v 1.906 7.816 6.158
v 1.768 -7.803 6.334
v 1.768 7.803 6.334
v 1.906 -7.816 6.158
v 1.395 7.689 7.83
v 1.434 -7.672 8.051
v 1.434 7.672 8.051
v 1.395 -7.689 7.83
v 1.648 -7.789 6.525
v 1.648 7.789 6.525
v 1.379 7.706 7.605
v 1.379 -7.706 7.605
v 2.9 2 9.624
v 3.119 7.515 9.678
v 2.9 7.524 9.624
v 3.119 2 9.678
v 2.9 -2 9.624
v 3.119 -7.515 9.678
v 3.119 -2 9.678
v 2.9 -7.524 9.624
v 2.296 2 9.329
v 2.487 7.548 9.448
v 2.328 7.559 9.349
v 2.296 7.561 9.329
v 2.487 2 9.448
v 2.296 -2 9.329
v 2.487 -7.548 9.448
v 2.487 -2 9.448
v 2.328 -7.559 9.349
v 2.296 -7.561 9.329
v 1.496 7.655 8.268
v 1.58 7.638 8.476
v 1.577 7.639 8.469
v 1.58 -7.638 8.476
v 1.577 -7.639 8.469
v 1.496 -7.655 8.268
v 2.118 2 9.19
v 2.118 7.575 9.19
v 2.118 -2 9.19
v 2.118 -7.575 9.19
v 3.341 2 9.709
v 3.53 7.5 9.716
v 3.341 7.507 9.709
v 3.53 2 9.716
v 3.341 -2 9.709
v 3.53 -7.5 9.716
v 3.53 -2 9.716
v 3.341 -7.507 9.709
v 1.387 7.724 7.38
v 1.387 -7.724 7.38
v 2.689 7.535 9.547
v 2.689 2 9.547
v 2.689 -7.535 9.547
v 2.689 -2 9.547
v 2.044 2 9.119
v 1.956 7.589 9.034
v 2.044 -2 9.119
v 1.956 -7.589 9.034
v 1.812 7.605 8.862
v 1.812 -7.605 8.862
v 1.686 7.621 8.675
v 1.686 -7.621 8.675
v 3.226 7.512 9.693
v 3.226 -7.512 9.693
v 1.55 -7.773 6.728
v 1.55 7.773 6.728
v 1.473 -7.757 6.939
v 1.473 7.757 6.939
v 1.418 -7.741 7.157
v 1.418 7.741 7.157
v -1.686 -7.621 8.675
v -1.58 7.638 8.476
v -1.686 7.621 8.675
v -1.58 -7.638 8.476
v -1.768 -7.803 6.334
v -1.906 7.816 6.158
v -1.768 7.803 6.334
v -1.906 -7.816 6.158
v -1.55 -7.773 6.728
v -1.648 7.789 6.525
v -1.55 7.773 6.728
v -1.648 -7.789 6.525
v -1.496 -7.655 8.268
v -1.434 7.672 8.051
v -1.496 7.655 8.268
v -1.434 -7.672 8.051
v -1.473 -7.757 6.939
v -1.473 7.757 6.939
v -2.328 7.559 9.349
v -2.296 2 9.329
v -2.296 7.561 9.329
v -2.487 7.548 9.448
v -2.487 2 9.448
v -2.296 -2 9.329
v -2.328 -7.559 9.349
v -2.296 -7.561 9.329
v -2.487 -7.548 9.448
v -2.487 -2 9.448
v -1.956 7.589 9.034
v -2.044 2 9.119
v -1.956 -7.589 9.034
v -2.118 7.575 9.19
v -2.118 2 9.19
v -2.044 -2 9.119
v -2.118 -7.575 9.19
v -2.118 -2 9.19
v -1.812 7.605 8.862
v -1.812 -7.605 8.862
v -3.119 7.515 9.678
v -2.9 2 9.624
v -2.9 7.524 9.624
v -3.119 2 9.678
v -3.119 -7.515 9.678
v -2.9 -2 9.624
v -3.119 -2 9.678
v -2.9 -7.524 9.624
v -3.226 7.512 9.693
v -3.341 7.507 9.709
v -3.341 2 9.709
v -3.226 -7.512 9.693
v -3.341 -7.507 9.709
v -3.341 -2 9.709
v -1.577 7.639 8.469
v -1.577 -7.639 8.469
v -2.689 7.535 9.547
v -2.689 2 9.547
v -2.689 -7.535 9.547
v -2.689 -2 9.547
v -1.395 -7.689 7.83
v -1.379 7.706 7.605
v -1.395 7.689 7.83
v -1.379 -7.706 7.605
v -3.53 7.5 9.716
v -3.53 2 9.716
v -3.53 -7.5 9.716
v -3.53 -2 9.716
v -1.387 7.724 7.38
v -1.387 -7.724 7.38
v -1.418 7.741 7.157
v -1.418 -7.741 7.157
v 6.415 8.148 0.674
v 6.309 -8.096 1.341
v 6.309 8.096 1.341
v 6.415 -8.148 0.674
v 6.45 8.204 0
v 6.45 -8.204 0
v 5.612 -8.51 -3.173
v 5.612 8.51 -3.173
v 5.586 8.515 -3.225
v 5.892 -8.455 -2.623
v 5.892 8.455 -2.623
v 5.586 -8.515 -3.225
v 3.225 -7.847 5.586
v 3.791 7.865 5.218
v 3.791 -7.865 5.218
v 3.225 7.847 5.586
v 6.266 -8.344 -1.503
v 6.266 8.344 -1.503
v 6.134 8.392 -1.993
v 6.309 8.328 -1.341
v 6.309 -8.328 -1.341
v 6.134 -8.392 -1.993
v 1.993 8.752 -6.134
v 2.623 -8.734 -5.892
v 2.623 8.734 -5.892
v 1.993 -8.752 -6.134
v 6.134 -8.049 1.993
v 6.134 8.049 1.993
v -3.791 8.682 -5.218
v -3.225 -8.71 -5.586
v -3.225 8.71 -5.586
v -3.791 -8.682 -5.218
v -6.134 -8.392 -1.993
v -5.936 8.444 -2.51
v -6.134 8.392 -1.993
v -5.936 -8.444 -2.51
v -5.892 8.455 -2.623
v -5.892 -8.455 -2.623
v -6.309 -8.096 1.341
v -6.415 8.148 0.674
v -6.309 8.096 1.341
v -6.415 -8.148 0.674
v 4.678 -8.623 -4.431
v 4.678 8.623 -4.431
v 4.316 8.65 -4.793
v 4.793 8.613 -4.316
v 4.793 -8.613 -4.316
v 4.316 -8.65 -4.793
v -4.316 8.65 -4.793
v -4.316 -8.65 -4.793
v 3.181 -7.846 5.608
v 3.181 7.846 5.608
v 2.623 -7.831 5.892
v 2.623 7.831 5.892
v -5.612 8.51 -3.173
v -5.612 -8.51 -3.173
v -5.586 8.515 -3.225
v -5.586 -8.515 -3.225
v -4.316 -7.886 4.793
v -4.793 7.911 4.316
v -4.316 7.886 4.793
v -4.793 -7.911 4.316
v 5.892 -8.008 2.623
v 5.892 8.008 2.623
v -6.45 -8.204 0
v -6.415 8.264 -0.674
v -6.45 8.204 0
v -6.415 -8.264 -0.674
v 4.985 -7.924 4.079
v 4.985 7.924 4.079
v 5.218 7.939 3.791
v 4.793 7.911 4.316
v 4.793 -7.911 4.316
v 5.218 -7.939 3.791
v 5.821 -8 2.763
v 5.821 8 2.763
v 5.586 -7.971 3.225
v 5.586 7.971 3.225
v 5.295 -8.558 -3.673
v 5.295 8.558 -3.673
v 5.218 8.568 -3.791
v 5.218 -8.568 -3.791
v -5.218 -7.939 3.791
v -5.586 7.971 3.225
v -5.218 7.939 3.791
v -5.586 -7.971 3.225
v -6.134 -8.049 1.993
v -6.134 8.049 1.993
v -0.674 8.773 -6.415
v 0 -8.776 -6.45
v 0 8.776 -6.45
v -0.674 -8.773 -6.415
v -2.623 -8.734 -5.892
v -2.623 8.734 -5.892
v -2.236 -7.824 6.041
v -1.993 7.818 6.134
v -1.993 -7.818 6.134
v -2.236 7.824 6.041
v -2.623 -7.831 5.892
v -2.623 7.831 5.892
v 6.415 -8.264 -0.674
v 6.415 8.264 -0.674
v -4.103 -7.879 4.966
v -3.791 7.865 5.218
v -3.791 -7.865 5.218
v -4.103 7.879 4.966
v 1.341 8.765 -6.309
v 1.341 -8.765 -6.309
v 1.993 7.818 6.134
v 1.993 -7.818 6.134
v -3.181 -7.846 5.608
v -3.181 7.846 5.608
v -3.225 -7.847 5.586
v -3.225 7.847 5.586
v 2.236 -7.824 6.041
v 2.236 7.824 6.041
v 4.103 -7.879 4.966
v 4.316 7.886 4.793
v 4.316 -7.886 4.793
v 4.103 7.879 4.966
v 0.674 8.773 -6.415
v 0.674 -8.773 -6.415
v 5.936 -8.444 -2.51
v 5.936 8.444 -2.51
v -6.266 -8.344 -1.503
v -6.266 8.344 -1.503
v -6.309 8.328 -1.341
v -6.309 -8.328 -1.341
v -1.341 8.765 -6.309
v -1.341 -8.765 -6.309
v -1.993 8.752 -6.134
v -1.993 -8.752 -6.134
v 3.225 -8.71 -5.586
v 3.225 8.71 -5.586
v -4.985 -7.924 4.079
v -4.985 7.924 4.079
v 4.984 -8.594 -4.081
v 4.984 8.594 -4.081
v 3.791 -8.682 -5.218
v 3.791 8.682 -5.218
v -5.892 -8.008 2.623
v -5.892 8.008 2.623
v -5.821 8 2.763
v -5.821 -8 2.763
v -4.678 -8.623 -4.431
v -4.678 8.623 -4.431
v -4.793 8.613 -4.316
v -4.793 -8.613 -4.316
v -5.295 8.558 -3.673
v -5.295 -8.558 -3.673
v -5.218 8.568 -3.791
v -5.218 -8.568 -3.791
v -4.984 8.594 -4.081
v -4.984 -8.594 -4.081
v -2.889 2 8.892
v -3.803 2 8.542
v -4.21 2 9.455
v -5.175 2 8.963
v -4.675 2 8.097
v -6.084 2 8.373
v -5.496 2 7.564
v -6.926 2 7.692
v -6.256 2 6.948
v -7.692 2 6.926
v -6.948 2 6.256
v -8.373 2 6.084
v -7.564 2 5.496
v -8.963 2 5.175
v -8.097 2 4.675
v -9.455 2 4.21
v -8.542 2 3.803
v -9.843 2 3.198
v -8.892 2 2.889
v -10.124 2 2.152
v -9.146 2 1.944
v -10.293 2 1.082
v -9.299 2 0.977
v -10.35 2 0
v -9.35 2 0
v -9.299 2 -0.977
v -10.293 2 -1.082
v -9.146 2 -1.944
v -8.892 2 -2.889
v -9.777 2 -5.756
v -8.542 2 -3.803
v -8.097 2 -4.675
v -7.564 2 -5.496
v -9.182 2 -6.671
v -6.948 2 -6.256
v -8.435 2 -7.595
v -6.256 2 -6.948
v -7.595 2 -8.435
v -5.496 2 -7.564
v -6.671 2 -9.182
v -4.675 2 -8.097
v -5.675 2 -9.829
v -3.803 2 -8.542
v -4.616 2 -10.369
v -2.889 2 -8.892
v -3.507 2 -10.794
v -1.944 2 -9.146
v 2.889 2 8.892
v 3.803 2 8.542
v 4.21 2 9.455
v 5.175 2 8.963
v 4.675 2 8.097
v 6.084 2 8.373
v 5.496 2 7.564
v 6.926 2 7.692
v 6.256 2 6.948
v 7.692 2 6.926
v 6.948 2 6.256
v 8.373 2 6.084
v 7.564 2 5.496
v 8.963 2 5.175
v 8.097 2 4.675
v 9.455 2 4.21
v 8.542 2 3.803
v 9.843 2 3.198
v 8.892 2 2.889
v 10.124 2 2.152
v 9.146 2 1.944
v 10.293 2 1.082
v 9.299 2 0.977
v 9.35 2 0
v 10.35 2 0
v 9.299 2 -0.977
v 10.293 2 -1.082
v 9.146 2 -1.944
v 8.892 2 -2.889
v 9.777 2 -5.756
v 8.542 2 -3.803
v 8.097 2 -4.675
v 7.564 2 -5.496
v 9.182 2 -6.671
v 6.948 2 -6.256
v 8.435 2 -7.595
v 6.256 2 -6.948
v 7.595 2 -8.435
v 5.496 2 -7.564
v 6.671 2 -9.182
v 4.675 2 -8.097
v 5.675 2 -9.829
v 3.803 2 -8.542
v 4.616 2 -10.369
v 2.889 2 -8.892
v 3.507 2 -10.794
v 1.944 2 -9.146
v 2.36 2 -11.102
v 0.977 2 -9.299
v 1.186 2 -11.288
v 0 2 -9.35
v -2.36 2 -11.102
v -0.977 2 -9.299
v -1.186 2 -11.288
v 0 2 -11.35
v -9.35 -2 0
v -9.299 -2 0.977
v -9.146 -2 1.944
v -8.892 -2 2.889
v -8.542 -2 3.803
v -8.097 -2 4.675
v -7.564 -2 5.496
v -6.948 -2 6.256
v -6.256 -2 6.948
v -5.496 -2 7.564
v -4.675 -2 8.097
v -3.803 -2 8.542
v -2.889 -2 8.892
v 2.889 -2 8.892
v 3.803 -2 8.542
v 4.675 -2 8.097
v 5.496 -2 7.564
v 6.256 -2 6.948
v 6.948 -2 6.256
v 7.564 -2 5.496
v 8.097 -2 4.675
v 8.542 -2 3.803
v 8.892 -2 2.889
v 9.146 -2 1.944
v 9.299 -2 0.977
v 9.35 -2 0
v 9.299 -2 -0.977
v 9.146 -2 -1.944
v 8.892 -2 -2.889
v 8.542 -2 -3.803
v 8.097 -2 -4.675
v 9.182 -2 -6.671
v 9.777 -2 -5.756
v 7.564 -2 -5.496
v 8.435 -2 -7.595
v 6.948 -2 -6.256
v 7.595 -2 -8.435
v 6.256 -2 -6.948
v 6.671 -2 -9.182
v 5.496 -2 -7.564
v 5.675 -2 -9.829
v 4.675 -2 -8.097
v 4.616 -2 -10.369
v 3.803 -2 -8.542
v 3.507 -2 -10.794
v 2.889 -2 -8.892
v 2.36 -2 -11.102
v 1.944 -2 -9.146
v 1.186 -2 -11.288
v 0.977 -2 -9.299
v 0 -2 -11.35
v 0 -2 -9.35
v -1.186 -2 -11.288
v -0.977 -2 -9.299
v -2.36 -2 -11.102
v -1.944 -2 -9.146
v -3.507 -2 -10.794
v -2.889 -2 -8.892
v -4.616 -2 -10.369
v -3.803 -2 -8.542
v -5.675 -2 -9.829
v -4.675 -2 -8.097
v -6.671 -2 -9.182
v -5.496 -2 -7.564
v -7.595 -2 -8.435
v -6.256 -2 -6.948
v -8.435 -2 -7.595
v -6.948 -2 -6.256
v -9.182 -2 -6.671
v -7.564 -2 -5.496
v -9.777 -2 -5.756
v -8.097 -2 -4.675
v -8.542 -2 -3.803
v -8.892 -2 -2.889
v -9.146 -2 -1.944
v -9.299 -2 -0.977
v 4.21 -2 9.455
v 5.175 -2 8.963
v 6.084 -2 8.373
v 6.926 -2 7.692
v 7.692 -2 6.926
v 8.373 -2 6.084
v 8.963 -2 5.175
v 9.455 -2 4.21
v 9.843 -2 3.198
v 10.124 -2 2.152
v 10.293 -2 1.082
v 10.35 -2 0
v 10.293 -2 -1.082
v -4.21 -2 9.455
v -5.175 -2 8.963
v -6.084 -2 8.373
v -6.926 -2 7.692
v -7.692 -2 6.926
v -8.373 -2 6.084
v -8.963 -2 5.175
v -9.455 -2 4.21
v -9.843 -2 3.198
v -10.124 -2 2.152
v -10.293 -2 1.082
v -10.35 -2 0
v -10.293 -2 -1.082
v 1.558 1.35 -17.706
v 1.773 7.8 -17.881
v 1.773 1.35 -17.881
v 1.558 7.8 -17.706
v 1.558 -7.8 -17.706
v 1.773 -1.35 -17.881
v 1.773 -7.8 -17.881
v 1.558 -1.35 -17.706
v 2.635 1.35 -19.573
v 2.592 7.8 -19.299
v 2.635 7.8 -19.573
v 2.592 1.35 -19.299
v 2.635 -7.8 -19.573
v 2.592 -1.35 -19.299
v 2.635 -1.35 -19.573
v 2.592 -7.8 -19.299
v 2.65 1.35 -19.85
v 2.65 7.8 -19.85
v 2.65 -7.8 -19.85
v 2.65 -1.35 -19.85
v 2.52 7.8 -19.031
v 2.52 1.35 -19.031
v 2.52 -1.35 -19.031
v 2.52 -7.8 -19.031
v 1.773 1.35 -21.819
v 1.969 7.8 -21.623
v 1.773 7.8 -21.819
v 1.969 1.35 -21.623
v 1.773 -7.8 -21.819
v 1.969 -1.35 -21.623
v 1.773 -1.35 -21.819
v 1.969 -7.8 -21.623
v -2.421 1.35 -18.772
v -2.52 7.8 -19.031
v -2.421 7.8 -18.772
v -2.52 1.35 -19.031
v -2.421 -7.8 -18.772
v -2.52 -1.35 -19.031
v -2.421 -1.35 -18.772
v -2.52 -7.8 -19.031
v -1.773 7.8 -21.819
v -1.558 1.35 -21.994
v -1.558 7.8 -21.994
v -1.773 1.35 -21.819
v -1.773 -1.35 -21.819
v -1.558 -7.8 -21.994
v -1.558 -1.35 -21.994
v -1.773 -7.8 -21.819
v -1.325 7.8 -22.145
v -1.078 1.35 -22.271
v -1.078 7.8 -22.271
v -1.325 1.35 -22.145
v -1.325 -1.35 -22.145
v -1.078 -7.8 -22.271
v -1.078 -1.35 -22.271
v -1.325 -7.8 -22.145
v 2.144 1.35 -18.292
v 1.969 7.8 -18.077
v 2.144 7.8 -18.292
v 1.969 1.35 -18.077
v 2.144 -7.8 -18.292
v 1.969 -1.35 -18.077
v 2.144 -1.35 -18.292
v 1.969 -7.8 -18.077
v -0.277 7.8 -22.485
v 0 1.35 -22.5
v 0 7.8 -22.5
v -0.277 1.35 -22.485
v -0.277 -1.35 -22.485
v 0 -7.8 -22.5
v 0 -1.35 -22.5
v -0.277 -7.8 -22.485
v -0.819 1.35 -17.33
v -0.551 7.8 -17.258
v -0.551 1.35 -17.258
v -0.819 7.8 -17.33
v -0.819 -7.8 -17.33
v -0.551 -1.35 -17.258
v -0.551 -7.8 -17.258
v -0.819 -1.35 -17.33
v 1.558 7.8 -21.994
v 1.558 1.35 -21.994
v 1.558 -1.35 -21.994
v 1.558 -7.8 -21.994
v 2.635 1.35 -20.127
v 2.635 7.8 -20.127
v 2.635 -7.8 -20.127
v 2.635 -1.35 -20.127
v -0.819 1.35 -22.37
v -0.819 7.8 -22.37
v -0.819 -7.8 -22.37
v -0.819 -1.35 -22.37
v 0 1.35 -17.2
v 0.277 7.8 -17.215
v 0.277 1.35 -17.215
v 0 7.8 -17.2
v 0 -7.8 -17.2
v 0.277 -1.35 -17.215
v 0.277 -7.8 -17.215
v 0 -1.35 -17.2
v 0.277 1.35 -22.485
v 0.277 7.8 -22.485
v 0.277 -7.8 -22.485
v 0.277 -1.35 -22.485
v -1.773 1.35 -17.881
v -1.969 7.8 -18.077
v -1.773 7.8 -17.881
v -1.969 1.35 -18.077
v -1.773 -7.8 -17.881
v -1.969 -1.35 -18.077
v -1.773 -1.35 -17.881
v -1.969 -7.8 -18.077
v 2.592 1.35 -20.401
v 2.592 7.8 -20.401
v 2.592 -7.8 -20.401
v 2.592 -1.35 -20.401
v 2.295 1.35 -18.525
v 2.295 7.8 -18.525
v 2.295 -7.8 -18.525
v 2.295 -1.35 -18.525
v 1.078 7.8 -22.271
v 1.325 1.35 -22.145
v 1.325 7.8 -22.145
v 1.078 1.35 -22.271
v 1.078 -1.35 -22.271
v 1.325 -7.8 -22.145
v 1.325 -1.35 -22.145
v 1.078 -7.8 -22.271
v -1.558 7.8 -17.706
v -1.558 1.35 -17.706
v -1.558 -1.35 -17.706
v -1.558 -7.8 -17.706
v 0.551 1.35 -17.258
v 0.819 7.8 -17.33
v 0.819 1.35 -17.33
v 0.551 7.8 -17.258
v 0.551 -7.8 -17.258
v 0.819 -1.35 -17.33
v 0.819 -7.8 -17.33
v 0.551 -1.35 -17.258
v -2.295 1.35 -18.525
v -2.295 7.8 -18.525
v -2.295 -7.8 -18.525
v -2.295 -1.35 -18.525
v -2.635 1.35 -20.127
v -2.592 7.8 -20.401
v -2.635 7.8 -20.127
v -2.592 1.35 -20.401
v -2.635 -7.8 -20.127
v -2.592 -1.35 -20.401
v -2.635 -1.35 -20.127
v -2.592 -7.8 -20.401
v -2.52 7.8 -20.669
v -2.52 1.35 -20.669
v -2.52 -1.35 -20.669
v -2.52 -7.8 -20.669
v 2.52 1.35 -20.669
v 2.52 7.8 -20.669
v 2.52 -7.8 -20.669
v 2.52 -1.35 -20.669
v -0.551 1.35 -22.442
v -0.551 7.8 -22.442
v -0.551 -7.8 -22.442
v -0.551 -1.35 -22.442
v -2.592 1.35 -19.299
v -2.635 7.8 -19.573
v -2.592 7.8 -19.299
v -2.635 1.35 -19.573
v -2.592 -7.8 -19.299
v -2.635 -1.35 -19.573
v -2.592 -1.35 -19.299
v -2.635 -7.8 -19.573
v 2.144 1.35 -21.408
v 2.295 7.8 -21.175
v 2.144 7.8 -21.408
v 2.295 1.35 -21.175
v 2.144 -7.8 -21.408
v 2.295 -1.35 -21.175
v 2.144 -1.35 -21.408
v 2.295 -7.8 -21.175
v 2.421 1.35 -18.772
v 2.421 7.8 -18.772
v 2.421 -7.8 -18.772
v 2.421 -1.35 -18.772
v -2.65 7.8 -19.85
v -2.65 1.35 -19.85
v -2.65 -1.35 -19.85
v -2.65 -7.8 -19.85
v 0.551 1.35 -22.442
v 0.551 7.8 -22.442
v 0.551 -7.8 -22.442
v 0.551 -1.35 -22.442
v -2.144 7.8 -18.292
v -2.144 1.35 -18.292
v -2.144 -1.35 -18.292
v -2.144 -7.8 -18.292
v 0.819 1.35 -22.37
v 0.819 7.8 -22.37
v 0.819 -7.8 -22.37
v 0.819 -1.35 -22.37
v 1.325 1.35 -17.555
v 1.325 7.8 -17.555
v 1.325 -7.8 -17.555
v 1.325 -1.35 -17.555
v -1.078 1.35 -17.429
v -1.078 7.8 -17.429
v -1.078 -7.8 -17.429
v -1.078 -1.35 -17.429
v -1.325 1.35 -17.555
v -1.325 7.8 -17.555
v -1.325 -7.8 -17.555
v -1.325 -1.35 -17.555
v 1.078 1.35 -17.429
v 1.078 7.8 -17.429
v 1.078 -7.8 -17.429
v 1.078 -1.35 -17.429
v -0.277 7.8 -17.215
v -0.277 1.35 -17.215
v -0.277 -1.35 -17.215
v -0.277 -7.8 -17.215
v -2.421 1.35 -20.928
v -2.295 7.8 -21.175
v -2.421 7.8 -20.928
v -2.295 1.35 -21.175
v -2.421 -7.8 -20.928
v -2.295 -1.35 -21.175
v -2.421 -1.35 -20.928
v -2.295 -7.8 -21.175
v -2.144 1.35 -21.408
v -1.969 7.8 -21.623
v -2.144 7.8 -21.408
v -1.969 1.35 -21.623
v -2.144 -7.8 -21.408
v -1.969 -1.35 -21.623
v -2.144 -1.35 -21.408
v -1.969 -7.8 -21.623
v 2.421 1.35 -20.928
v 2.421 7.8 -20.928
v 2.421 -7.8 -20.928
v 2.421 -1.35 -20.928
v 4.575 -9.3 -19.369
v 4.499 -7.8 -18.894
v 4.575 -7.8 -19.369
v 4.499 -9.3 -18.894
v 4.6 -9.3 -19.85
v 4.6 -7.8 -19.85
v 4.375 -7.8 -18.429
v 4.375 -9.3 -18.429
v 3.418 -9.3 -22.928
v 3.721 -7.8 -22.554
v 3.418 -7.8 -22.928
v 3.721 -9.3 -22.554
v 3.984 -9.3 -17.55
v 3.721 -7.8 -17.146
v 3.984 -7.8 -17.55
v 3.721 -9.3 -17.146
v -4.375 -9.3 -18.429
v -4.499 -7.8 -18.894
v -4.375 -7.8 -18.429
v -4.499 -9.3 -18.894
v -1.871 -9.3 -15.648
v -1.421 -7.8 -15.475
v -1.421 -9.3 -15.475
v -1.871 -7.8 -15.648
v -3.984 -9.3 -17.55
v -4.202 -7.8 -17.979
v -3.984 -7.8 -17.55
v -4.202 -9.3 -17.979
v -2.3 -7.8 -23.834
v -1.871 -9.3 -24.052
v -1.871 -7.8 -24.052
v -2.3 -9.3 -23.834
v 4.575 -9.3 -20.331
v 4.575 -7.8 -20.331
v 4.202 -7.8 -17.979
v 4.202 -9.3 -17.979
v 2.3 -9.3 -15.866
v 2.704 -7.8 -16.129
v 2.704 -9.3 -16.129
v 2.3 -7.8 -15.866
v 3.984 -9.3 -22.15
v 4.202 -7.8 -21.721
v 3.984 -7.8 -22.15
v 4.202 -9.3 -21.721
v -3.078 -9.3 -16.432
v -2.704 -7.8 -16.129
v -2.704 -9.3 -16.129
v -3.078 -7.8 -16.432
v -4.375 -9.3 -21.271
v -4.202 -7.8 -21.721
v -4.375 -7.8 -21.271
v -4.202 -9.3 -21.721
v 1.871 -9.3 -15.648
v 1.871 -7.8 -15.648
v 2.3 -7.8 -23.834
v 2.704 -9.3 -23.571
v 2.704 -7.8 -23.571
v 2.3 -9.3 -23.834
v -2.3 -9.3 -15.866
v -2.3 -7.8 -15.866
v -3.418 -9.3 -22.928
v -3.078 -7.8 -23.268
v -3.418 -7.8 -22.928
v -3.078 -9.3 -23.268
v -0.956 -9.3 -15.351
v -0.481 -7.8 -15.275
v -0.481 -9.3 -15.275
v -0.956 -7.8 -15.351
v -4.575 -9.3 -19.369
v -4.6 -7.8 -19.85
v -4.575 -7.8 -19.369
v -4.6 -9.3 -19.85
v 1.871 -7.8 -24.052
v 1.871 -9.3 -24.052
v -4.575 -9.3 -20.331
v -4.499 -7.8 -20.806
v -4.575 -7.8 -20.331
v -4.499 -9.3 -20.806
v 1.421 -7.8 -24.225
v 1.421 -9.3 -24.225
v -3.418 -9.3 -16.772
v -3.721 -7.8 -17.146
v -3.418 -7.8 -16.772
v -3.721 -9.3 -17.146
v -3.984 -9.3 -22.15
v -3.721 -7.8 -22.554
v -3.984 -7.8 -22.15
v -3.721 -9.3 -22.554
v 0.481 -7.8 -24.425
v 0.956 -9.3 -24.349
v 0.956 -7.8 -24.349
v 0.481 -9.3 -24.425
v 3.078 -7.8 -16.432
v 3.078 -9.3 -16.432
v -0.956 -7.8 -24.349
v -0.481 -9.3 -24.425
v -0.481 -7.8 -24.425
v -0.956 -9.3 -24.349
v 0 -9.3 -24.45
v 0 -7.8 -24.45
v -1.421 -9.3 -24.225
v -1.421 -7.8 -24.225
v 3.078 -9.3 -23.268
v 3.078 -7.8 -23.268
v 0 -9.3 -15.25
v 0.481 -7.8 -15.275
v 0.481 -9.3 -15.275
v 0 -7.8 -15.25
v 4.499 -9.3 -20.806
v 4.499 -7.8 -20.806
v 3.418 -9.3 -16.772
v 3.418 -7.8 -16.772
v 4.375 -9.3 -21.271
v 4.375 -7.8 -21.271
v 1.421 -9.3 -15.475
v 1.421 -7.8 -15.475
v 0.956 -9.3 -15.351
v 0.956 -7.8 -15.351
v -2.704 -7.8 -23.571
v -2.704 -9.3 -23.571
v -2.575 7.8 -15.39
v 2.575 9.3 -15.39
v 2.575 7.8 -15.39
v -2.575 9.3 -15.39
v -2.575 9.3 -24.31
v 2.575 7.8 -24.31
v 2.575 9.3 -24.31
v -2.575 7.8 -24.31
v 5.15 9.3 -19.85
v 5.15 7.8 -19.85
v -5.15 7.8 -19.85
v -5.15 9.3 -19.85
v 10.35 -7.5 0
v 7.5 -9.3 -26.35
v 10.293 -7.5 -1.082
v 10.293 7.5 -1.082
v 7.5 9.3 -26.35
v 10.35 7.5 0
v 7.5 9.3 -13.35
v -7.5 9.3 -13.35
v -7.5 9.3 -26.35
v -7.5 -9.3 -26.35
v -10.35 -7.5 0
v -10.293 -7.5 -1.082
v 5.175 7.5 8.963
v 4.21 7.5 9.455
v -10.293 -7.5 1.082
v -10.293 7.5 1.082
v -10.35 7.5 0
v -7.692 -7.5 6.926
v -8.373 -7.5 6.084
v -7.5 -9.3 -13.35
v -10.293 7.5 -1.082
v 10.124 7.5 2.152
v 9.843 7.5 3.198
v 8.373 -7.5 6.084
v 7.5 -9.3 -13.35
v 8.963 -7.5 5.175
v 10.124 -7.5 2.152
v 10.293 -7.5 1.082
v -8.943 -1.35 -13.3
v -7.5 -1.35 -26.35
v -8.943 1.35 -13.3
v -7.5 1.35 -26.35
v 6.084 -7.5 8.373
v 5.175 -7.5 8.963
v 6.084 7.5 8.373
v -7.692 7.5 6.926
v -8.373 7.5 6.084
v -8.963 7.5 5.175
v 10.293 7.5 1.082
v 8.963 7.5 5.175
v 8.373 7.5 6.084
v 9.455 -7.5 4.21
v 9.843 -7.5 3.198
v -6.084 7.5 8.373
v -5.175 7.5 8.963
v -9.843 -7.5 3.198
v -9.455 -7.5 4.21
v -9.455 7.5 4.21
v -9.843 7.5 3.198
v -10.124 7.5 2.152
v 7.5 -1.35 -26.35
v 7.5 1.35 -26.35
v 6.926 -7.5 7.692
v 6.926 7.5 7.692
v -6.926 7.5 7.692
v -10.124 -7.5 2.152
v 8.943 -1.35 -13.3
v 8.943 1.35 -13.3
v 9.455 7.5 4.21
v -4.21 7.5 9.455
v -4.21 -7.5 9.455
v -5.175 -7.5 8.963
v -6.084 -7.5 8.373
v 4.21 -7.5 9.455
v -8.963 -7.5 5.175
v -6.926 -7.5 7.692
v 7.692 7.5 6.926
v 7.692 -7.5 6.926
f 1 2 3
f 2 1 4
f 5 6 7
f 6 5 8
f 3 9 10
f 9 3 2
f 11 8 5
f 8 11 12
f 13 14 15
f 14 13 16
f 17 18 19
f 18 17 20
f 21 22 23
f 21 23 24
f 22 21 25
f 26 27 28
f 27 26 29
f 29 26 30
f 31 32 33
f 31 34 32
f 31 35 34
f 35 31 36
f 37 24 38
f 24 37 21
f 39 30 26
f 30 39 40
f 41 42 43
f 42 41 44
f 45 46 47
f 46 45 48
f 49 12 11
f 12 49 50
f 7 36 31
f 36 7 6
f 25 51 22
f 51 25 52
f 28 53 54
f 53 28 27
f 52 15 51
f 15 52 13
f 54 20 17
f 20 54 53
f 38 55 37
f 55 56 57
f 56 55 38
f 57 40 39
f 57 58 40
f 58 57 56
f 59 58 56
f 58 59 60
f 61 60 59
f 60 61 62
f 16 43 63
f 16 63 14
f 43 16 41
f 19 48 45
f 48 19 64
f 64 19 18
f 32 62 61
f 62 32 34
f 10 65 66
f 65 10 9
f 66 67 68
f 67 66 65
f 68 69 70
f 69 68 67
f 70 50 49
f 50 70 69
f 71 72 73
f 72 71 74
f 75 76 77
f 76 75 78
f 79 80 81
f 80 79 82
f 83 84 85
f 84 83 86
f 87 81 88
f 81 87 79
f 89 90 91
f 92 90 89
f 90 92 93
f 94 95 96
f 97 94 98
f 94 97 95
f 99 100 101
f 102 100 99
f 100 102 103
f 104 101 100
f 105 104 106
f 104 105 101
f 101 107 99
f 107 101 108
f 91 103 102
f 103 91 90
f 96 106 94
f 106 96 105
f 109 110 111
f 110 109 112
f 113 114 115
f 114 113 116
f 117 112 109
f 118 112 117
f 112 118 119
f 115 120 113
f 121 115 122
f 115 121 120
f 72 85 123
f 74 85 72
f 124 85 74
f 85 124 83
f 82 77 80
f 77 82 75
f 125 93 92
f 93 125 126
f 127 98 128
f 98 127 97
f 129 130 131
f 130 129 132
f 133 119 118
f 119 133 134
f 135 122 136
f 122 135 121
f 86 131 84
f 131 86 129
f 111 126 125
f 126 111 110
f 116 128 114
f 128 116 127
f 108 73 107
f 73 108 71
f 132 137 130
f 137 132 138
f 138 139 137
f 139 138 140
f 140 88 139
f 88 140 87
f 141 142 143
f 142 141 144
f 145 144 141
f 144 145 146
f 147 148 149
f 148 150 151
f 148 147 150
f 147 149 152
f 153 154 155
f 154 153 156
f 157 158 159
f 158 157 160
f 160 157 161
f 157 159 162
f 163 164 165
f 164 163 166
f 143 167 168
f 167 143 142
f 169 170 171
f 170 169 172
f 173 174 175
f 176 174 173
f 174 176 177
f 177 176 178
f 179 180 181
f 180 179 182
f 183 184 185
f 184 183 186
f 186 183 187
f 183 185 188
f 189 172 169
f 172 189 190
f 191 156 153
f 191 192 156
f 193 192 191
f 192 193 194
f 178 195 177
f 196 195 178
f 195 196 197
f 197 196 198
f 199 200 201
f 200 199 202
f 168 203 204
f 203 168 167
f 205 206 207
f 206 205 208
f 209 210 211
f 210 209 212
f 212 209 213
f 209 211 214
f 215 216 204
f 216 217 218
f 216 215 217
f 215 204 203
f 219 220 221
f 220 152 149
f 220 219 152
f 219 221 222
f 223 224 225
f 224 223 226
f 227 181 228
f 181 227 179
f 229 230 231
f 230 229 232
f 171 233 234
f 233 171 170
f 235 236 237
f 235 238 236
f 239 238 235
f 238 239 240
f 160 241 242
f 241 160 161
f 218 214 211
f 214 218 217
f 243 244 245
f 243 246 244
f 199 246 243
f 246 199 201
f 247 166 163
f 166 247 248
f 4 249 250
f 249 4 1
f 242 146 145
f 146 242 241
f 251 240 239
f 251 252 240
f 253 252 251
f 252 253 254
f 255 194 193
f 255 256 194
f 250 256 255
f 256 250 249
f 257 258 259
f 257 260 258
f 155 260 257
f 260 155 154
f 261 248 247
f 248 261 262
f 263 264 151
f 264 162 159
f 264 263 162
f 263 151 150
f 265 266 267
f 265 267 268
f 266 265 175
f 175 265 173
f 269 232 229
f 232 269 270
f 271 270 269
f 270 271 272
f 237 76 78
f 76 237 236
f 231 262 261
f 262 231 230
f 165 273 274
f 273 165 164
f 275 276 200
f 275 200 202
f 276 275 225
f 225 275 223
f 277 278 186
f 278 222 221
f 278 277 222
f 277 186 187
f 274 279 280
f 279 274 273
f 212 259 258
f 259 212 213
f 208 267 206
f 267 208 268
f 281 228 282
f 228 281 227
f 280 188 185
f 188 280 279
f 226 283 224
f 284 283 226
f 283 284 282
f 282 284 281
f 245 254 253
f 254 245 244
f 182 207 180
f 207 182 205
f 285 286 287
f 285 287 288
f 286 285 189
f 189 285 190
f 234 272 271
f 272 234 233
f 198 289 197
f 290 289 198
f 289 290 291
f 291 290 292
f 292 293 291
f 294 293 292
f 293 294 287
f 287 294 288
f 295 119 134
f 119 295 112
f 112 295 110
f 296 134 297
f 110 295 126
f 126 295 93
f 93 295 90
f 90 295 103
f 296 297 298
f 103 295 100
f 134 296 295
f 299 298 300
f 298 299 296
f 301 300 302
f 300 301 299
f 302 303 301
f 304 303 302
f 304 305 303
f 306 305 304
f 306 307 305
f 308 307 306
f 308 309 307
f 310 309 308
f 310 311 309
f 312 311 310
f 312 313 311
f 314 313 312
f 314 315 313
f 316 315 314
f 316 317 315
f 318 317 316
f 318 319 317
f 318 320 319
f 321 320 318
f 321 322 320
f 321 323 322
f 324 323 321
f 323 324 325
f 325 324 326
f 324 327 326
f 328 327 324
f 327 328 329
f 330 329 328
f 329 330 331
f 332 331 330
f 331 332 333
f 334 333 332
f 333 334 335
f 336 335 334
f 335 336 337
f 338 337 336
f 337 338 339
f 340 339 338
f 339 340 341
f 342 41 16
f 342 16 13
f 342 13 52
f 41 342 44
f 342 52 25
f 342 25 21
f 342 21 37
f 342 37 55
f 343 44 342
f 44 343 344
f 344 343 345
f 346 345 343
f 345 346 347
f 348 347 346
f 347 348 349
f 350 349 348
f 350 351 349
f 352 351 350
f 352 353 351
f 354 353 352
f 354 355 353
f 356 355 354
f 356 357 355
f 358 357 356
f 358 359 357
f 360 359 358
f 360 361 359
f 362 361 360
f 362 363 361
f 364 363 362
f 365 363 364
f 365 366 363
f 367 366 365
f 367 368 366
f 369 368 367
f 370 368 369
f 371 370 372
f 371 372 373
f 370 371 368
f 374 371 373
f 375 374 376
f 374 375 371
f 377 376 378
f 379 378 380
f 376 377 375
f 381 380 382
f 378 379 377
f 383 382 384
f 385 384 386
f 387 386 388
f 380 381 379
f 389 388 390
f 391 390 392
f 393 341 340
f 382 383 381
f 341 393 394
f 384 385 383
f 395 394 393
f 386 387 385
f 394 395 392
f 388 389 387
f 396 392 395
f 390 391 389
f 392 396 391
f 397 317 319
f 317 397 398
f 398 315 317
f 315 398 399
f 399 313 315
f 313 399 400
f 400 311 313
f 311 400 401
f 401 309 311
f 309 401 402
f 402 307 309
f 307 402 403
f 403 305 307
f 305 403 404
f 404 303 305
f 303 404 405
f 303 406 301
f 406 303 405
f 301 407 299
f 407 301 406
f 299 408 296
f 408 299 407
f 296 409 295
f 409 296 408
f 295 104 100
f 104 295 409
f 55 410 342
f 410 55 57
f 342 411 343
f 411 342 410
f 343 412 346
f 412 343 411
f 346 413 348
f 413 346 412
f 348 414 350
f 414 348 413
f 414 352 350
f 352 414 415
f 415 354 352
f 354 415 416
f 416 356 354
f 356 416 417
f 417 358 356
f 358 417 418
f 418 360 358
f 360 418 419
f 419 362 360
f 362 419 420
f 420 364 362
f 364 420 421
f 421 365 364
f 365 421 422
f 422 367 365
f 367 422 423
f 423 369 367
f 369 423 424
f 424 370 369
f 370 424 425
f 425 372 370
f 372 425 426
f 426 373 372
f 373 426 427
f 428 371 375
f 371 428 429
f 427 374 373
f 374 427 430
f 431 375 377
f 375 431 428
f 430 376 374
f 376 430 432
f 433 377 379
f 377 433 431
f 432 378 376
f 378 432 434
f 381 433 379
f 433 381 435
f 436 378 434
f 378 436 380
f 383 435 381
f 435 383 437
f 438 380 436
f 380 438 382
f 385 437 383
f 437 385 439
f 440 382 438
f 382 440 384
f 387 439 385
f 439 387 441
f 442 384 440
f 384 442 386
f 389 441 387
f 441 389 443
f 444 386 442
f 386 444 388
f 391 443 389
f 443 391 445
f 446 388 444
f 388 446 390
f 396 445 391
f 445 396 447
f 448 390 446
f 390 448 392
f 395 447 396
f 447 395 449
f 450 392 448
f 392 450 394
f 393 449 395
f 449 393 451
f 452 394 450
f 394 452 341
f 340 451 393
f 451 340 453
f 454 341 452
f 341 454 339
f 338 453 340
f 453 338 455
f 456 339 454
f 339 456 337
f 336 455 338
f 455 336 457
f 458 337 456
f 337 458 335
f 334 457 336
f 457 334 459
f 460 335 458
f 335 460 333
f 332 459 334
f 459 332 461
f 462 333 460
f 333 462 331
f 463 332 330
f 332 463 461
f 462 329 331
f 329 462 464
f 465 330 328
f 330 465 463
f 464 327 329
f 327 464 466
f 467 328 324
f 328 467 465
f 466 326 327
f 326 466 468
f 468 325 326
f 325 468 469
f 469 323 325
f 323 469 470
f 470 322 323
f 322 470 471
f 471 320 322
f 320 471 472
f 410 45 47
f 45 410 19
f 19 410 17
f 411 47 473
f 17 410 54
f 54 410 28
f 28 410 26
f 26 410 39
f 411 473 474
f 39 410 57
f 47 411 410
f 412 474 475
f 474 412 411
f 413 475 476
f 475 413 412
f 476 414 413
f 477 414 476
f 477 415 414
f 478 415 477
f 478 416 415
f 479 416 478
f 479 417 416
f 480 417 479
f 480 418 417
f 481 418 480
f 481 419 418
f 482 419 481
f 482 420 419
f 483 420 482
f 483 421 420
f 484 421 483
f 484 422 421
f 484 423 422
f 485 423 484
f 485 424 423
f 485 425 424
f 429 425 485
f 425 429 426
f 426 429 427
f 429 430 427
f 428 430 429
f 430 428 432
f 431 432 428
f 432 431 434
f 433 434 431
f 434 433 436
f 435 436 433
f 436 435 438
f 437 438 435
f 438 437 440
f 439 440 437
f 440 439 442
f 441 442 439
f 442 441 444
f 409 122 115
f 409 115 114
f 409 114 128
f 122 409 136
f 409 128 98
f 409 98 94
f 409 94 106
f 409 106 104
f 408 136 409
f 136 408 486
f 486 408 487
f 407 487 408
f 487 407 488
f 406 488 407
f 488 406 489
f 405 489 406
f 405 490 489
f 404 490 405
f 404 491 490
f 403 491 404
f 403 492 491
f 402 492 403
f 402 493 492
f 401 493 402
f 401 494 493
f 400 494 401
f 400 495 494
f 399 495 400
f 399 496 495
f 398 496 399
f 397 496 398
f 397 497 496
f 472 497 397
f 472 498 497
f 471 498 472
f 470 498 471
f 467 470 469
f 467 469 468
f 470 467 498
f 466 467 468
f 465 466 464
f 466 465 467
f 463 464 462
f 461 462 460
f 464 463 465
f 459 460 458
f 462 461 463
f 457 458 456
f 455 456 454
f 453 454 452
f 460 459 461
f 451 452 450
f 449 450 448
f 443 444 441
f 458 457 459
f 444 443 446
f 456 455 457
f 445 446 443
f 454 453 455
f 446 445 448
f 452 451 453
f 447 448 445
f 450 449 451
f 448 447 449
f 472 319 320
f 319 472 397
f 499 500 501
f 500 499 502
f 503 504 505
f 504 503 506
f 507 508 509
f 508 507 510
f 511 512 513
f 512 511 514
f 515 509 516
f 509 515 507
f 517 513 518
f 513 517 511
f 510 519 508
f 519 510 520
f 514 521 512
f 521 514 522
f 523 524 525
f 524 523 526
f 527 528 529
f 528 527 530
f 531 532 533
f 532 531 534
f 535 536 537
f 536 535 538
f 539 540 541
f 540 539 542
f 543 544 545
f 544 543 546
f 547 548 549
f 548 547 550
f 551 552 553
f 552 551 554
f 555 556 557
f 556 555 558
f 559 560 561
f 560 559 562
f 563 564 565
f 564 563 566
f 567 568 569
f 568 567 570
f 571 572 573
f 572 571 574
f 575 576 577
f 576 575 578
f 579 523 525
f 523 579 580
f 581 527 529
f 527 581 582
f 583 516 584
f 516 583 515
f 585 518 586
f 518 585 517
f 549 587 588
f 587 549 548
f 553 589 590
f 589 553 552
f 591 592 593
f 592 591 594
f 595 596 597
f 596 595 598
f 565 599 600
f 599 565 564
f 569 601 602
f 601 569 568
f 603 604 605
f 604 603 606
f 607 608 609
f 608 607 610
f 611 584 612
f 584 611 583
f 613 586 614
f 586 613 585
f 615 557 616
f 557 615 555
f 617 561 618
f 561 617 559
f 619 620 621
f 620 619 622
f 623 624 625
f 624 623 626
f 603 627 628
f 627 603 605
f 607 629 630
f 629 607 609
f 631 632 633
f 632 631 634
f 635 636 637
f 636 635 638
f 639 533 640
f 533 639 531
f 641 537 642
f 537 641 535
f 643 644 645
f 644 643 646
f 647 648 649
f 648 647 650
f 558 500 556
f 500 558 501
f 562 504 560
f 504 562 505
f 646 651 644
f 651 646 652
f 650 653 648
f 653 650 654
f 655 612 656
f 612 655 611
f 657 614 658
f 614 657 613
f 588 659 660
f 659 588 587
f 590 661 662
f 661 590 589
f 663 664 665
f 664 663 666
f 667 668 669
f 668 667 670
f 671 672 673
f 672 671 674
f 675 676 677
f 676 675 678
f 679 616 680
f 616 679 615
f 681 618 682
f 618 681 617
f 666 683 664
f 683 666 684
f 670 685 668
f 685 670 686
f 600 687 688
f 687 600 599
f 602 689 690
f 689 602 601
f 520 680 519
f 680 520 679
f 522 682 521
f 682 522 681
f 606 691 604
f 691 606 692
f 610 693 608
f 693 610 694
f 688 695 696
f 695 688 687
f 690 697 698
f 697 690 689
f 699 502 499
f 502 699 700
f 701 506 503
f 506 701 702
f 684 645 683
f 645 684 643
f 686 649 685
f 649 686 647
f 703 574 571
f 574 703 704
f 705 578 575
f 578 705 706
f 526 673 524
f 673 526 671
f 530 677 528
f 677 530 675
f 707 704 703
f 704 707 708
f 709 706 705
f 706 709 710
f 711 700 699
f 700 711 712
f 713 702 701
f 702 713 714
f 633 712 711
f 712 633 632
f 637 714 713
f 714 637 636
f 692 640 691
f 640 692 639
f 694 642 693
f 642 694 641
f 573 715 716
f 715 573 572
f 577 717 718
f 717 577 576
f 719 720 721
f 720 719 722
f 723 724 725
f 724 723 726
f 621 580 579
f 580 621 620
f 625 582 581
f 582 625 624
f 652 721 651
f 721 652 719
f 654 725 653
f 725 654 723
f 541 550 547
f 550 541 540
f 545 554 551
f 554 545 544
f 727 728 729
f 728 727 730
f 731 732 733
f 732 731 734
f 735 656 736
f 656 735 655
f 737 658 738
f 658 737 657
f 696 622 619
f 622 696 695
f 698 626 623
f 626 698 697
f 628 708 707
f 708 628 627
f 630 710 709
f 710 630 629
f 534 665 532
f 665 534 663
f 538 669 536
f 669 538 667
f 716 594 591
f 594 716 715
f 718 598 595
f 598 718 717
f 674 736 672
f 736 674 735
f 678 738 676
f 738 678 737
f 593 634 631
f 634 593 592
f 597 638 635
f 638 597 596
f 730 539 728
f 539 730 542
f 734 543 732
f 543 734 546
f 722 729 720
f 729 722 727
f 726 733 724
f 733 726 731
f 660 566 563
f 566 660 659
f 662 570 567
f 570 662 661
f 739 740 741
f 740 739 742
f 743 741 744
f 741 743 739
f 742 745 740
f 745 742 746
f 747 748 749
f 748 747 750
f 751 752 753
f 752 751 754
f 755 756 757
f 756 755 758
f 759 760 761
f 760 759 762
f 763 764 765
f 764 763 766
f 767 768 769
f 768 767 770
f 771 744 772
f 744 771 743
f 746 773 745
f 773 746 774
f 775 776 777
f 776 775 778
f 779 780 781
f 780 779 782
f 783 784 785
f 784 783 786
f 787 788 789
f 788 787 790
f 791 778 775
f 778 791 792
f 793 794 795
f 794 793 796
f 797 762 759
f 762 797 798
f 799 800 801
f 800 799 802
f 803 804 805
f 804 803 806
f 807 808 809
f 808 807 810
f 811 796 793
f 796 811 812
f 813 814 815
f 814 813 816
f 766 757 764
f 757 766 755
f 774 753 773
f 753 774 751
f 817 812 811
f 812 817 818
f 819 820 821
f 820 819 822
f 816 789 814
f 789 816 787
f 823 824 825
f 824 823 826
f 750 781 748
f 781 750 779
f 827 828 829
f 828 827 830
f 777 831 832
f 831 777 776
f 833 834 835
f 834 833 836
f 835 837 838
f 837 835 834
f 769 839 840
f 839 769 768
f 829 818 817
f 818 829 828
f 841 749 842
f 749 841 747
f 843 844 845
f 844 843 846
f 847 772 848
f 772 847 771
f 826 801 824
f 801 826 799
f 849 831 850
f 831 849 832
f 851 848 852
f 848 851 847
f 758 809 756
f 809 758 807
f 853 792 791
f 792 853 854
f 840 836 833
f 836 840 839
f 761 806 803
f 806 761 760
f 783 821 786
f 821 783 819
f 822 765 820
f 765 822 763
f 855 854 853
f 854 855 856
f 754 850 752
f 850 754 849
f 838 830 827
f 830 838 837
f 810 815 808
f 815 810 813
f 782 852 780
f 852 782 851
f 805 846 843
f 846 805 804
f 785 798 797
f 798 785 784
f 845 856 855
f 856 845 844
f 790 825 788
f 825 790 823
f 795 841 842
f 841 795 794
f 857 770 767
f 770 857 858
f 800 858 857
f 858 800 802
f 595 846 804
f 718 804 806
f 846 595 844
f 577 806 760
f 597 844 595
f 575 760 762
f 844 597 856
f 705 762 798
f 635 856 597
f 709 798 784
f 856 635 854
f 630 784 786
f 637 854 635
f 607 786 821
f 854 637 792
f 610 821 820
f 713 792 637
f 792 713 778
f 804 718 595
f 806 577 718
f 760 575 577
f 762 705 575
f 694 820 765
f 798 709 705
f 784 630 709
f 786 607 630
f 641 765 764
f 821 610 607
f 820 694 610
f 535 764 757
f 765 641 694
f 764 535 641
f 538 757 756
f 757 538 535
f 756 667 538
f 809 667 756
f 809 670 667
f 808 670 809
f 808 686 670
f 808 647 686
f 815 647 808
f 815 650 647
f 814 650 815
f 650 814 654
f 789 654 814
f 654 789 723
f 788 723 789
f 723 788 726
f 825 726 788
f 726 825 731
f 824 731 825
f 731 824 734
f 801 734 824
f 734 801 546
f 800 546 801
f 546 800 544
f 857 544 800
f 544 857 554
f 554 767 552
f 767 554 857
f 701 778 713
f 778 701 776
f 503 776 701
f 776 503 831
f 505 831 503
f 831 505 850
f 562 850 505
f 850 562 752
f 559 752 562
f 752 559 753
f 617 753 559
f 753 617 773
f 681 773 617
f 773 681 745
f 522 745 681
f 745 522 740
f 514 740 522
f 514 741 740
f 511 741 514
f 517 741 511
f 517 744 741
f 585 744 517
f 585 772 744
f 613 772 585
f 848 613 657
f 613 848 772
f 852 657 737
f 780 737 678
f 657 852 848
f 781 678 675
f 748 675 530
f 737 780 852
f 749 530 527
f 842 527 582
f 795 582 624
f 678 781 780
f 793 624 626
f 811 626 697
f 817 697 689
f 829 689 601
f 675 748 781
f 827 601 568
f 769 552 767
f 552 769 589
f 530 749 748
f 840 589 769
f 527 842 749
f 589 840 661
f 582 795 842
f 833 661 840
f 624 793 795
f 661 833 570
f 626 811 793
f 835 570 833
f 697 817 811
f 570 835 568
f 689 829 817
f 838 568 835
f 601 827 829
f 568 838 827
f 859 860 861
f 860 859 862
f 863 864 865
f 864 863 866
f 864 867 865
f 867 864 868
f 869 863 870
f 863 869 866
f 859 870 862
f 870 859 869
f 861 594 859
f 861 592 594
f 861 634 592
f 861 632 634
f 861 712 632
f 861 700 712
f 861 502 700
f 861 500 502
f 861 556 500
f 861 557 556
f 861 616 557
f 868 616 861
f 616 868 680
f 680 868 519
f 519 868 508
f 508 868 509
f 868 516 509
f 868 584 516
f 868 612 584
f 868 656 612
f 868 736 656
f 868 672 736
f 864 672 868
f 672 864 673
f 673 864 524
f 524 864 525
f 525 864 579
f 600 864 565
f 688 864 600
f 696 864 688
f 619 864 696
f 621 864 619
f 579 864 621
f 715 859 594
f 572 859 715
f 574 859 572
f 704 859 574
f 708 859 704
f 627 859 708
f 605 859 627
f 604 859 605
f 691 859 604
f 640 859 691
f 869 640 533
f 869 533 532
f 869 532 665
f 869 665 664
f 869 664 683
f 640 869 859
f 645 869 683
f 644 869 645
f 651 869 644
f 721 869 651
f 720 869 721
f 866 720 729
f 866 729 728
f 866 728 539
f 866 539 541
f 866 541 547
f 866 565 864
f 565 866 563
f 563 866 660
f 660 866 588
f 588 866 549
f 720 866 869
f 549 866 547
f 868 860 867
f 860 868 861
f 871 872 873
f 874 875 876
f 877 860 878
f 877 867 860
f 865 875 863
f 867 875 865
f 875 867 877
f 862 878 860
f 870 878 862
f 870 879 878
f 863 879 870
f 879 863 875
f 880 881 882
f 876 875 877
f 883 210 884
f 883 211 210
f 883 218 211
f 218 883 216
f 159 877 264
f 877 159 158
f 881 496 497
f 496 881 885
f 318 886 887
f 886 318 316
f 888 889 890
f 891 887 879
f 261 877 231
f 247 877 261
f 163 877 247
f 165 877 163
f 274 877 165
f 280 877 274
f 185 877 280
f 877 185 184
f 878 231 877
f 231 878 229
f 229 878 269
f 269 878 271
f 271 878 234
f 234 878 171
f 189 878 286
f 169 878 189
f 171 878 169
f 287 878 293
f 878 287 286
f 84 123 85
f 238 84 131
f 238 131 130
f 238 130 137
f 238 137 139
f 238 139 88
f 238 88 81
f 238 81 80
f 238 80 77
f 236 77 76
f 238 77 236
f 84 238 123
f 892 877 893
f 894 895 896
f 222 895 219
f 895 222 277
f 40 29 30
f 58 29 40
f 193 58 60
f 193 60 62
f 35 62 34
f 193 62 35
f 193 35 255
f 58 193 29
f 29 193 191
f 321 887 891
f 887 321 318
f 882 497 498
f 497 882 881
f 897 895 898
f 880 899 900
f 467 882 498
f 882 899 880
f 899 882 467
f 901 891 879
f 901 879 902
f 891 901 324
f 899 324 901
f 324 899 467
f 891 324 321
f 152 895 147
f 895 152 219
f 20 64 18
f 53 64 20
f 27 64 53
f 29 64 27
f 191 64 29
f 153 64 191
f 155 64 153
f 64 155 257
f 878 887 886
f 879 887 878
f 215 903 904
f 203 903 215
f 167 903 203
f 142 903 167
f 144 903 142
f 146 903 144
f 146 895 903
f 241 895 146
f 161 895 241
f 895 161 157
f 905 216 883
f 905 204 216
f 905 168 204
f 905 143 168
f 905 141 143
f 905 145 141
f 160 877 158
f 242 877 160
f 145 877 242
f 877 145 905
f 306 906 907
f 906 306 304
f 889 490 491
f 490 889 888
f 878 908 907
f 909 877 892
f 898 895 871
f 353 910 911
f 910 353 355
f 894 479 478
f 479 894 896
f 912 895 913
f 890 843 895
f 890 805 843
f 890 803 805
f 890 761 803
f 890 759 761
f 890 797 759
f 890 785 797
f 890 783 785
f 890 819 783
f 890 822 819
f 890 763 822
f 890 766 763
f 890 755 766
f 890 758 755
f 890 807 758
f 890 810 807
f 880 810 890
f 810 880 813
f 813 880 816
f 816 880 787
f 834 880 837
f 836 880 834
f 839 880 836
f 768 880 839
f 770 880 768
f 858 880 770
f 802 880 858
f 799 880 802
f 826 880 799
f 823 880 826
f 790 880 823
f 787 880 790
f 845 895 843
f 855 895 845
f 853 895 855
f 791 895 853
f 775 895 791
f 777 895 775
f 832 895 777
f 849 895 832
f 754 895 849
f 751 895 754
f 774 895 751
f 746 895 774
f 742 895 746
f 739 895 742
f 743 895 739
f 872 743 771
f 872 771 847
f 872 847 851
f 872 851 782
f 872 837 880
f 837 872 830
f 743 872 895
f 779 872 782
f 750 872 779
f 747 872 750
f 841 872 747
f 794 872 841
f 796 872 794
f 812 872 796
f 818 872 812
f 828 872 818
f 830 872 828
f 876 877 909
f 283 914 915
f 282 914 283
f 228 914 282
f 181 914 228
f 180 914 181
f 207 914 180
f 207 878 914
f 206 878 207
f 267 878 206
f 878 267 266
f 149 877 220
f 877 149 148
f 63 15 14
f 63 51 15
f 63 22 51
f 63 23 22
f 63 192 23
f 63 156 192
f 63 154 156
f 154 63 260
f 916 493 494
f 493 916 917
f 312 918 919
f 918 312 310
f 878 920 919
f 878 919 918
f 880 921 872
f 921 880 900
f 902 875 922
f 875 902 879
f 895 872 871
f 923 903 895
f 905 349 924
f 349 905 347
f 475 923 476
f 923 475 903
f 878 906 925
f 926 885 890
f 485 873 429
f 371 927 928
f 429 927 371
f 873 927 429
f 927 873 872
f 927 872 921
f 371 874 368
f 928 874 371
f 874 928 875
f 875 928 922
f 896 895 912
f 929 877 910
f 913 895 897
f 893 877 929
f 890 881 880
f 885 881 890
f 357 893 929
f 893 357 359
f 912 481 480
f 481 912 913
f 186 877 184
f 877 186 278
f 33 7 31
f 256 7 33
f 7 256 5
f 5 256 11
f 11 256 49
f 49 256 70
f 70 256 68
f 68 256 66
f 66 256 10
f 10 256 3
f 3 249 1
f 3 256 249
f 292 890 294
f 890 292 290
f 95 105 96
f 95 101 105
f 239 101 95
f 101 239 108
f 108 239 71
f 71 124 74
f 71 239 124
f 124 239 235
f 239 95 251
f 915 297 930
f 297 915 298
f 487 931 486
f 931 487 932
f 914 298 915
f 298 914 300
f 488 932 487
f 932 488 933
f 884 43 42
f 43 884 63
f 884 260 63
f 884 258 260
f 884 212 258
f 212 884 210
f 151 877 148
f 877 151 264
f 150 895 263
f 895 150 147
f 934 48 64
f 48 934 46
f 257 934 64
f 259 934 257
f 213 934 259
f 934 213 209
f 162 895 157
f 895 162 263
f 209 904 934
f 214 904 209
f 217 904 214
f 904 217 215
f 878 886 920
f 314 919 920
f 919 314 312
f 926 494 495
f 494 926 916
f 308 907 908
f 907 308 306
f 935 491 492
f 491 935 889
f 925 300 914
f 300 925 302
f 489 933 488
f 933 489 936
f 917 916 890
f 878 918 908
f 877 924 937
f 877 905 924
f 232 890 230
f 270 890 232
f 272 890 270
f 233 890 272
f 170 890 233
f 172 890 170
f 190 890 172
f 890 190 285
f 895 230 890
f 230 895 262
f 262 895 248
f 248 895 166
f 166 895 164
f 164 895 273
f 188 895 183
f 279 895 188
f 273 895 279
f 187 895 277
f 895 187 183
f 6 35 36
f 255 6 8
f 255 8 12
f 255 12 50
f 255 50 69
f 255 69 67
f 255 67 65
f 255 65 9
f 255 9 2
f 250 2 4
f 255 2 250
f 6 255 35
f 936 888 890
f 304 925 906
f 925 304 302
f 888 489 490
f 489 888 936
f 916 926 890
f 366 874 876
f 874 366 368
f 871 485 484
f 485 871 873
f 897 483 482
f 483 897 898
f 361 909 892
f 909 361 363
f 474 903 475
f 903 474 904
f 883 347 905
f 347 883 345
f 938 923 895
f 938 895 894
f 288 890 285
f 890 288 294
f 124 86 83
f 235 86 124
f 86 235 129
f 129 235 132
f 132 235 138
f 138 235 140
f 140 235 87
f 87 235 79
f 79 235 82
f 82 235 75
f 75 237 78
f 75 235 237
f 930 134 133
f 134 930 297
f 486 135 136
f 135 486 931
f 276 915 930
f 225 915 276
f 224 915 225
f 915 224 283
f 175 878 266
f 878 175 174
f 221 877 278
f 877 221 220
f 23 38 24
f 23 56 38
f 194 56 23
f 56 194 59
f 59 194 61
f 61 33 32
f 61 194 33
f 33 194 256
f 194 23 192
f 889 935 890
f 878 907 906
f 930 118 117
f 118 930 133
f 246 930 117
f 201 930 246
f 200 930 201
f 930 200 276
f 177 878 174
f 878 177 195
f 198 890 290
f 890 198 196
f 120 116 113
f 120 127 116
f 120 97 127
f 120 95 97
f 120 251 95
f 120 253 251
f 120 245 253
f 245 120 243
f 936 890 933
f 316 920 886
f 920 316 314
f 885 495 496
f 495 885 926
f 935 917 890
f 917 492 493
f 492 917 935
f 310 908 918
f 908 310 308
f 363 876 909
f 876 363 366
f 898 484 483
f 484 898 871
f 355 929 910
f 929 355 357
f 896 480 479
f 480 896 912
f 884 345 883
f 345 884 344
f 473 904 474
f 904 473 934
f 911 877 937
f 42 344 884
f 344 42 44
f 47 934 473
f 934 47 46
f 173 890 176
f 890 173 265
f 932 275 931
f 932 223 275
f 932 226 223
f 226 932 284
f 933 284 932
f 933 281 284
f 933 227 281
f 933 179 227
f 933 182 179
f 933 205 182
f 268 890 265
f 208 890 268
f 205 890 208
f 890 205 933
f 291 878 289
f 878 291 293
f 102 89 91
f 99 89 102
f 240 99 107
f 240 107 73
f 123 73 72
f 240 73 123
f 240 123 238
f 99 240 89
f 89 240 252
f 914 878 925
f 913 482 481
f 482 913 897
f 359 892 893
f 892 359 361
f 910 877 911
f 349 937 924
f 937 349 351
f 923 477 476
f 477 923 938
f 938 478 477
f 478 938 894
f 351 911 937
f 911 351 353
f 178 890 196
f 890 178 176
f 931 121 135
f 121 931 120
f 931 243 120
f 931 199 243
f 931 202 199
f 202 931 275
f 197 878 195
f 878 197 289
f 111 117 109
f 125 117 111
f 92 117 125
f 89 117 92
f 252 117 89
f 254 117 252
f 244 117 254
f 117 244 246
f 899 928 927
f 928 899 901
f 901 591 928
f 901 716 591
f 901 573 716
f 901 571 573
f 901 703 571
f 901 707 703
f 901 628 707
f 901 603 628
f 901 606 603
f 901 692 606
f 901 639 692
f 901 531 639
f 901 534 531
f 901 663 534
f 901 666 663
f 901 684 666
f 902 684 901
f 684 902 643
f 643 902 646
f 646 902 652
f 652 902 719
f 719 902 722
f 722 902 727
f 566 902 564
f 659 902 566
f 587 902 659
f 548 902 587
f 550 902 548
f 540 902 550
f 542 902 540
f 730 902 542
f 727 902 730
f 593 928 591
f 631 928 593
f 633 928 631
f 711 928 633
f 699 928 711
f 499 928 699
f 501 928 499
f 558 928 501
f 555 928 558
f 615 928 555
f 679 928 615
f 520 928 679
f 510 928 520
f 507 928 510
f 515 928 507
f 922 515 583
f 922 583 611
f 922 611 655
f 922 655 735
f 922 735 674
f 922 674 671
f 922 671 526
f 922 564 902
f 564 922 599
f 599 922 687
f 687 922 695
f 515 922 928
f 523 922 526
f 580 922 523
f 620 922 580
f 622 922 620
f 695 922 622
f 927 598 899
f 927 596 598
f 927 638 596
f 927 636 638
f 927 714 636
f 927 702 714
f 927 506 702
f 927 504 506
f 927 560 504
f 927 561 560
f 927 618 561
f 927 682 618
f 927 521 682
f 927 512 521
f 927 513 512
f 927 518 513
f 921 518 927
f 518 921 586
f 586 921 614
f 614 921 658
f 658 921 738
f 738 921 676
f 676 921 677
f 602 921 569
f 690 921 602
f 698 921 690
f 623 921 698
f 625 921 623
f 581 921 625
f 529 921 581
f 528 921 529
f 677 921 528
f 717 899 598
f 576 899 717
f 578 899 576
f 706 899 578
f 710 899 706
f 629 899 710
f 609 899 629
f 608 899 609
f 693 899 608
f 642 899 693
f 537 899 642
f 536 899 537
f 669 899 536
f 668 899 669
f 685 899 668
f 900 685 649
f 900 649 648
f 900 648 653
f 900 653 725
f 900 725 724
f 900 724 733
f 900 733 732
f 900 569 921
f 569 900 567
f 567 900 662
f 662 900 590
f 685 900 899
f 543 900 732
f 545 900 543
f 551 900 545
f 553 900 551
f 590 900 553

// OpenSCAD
in = 25.4;

tube_rad = in * .25;
gutter_wall = 2.6;

screw_rad = 5.3/2;
screw_cap_rad = 9.2/2;
nut_rad = 10.3/2;
wall = 4;

!endcap_tube_mount();
gutter_tube_mount();



$fn=60;

//clamp to downspouts and hang the vacuum tube?
module drain(){
}

//clamp the tube to the side of the k-type gutter
module tube_mount(solid = 1, length=15, open_angle = 40, chamfer = false){
    if(solid == 1){
        rotate([90,0,0]) cylinder(r=tube_rad+wall, h=length, center=true);
    }else{
        //tube hole
        rotate([90,0,0]) cylinder(r=tube_rad+.1, h=50, center=true);
        
        //opening at the top
        difference(){
            intersection(){
                translate([0,-25,0]) rotate([0,-45+open_angle/2,0]) cube([50,50,50]);
                translate([0,-15,0]) rotate([0,-45-open_angle/2,0]) cube([50,50,50]);
            }
            for(i=[0,1]) mirror([i,0,0]) rotate([0,open_angle/2, 0]) translate([0,0,tube_rad+wall/2]) rotate([90,0,0]) cylinder(r=wall/2+.15, h=50, center=true);
        }
        
        //zip tie slot
        rotate([90,0,0]) rotate_extrude(){
            translate([tube_rad+wall,0,0]) square([2,4], center=true);
        }
        
        if(chamfer == true){
            for(i=[0:1]) mirror([0,i,0]) translate([0,-length/4,0]) rotate([90,0,0]) cylinder(r1=tube_rad+.1, r2=tube_rad+.1+length/2, h=length/2, center=false);
        }
    }
}

module gutter_tube_mount(length = 29, slit_depth = 13, open_angle = 50, lift = 16){
    lip_width = 15;
    lip_height = 10;
    lip_lift = 6;
    
    slit_offset = -6;
    
    difference(){
        hull(){
            tube_mount(solid = 1, length=length, open_angle = open_angle);
            translate([0,0,-tube_rad-slit_depth/2-lift]) cube([length,gutter_wall+wall*6,slit_depth], center=true);
        }
        tube_mount(solid = -1, length=length, open_angle = open_angle, chamfer=true);
        
        translate([0,slit_offset,0]){
            //gutter lip
            translate([0,lip_width/2-gutter_wall/2,-tube_rad-lip_height/2-lip_lift]) cube([100, lip_width, lip_height], center=true);
        
            //slit for gutter
            translate([0,0,-tube_rad-slit_depth/2-lift]) cube([length*2,gutter_wall+.1,slit_depth+.1], center=true);
        
            //screwhole
            translate([0,0,-tube_rad-slit_depth/2-lift]) rotate([90,0,0]){
                cylinder(r=screw_rad, h=50, center=true);
                translate([0,0,gutter_wall*3]) cylinder(r=screw_cap_rad, h=50);
                translate([0,0,-gutter_wall*3]) rotate([180,0,0]) cylinder(r=nut_rad, h=50, $fn=6);
            }
        }
    }
}

//clamp the tube to the back of the gutter.  Screws to clamp on, print in TPU.
module endcap_tube_mount(length = 15, slit_depth = 13, open_angle = 50, lift = 7){
    difference(){
        hull(){
            tube_mount(solid = 1, length=length, open_angle = open_angle);
            translate([0,0,-tube_rad-slit_depth/2-lift]) cube([length,gutter_wall+wall*4,slit_depth], center=true);
        }
        tube_mount(solid = -1, length=length, open_angle = open_angle);
        
        //slit for gutter
        translate([0,0,-tube_rad-slit_depth/2-lift]) cube([length*2,gutter_wall+.1,slit_depth+.1], center=true);
        
        //screwhole
        translate([0,0,-tube_rad-slit_depth/2-lift]) rotate([90,0,0]){
            cylinder(r=screw_rad, h=50, center=true);
            translate([0,0,gutter_wall*3]) cylinder(r=screw_cap_rad, h=50);
            translate([0,0,-gutter_wall*3]) rotate([180,0,0]) cylinder(r=nut_rad, h=50, $fn=6);
        }
    }
}
